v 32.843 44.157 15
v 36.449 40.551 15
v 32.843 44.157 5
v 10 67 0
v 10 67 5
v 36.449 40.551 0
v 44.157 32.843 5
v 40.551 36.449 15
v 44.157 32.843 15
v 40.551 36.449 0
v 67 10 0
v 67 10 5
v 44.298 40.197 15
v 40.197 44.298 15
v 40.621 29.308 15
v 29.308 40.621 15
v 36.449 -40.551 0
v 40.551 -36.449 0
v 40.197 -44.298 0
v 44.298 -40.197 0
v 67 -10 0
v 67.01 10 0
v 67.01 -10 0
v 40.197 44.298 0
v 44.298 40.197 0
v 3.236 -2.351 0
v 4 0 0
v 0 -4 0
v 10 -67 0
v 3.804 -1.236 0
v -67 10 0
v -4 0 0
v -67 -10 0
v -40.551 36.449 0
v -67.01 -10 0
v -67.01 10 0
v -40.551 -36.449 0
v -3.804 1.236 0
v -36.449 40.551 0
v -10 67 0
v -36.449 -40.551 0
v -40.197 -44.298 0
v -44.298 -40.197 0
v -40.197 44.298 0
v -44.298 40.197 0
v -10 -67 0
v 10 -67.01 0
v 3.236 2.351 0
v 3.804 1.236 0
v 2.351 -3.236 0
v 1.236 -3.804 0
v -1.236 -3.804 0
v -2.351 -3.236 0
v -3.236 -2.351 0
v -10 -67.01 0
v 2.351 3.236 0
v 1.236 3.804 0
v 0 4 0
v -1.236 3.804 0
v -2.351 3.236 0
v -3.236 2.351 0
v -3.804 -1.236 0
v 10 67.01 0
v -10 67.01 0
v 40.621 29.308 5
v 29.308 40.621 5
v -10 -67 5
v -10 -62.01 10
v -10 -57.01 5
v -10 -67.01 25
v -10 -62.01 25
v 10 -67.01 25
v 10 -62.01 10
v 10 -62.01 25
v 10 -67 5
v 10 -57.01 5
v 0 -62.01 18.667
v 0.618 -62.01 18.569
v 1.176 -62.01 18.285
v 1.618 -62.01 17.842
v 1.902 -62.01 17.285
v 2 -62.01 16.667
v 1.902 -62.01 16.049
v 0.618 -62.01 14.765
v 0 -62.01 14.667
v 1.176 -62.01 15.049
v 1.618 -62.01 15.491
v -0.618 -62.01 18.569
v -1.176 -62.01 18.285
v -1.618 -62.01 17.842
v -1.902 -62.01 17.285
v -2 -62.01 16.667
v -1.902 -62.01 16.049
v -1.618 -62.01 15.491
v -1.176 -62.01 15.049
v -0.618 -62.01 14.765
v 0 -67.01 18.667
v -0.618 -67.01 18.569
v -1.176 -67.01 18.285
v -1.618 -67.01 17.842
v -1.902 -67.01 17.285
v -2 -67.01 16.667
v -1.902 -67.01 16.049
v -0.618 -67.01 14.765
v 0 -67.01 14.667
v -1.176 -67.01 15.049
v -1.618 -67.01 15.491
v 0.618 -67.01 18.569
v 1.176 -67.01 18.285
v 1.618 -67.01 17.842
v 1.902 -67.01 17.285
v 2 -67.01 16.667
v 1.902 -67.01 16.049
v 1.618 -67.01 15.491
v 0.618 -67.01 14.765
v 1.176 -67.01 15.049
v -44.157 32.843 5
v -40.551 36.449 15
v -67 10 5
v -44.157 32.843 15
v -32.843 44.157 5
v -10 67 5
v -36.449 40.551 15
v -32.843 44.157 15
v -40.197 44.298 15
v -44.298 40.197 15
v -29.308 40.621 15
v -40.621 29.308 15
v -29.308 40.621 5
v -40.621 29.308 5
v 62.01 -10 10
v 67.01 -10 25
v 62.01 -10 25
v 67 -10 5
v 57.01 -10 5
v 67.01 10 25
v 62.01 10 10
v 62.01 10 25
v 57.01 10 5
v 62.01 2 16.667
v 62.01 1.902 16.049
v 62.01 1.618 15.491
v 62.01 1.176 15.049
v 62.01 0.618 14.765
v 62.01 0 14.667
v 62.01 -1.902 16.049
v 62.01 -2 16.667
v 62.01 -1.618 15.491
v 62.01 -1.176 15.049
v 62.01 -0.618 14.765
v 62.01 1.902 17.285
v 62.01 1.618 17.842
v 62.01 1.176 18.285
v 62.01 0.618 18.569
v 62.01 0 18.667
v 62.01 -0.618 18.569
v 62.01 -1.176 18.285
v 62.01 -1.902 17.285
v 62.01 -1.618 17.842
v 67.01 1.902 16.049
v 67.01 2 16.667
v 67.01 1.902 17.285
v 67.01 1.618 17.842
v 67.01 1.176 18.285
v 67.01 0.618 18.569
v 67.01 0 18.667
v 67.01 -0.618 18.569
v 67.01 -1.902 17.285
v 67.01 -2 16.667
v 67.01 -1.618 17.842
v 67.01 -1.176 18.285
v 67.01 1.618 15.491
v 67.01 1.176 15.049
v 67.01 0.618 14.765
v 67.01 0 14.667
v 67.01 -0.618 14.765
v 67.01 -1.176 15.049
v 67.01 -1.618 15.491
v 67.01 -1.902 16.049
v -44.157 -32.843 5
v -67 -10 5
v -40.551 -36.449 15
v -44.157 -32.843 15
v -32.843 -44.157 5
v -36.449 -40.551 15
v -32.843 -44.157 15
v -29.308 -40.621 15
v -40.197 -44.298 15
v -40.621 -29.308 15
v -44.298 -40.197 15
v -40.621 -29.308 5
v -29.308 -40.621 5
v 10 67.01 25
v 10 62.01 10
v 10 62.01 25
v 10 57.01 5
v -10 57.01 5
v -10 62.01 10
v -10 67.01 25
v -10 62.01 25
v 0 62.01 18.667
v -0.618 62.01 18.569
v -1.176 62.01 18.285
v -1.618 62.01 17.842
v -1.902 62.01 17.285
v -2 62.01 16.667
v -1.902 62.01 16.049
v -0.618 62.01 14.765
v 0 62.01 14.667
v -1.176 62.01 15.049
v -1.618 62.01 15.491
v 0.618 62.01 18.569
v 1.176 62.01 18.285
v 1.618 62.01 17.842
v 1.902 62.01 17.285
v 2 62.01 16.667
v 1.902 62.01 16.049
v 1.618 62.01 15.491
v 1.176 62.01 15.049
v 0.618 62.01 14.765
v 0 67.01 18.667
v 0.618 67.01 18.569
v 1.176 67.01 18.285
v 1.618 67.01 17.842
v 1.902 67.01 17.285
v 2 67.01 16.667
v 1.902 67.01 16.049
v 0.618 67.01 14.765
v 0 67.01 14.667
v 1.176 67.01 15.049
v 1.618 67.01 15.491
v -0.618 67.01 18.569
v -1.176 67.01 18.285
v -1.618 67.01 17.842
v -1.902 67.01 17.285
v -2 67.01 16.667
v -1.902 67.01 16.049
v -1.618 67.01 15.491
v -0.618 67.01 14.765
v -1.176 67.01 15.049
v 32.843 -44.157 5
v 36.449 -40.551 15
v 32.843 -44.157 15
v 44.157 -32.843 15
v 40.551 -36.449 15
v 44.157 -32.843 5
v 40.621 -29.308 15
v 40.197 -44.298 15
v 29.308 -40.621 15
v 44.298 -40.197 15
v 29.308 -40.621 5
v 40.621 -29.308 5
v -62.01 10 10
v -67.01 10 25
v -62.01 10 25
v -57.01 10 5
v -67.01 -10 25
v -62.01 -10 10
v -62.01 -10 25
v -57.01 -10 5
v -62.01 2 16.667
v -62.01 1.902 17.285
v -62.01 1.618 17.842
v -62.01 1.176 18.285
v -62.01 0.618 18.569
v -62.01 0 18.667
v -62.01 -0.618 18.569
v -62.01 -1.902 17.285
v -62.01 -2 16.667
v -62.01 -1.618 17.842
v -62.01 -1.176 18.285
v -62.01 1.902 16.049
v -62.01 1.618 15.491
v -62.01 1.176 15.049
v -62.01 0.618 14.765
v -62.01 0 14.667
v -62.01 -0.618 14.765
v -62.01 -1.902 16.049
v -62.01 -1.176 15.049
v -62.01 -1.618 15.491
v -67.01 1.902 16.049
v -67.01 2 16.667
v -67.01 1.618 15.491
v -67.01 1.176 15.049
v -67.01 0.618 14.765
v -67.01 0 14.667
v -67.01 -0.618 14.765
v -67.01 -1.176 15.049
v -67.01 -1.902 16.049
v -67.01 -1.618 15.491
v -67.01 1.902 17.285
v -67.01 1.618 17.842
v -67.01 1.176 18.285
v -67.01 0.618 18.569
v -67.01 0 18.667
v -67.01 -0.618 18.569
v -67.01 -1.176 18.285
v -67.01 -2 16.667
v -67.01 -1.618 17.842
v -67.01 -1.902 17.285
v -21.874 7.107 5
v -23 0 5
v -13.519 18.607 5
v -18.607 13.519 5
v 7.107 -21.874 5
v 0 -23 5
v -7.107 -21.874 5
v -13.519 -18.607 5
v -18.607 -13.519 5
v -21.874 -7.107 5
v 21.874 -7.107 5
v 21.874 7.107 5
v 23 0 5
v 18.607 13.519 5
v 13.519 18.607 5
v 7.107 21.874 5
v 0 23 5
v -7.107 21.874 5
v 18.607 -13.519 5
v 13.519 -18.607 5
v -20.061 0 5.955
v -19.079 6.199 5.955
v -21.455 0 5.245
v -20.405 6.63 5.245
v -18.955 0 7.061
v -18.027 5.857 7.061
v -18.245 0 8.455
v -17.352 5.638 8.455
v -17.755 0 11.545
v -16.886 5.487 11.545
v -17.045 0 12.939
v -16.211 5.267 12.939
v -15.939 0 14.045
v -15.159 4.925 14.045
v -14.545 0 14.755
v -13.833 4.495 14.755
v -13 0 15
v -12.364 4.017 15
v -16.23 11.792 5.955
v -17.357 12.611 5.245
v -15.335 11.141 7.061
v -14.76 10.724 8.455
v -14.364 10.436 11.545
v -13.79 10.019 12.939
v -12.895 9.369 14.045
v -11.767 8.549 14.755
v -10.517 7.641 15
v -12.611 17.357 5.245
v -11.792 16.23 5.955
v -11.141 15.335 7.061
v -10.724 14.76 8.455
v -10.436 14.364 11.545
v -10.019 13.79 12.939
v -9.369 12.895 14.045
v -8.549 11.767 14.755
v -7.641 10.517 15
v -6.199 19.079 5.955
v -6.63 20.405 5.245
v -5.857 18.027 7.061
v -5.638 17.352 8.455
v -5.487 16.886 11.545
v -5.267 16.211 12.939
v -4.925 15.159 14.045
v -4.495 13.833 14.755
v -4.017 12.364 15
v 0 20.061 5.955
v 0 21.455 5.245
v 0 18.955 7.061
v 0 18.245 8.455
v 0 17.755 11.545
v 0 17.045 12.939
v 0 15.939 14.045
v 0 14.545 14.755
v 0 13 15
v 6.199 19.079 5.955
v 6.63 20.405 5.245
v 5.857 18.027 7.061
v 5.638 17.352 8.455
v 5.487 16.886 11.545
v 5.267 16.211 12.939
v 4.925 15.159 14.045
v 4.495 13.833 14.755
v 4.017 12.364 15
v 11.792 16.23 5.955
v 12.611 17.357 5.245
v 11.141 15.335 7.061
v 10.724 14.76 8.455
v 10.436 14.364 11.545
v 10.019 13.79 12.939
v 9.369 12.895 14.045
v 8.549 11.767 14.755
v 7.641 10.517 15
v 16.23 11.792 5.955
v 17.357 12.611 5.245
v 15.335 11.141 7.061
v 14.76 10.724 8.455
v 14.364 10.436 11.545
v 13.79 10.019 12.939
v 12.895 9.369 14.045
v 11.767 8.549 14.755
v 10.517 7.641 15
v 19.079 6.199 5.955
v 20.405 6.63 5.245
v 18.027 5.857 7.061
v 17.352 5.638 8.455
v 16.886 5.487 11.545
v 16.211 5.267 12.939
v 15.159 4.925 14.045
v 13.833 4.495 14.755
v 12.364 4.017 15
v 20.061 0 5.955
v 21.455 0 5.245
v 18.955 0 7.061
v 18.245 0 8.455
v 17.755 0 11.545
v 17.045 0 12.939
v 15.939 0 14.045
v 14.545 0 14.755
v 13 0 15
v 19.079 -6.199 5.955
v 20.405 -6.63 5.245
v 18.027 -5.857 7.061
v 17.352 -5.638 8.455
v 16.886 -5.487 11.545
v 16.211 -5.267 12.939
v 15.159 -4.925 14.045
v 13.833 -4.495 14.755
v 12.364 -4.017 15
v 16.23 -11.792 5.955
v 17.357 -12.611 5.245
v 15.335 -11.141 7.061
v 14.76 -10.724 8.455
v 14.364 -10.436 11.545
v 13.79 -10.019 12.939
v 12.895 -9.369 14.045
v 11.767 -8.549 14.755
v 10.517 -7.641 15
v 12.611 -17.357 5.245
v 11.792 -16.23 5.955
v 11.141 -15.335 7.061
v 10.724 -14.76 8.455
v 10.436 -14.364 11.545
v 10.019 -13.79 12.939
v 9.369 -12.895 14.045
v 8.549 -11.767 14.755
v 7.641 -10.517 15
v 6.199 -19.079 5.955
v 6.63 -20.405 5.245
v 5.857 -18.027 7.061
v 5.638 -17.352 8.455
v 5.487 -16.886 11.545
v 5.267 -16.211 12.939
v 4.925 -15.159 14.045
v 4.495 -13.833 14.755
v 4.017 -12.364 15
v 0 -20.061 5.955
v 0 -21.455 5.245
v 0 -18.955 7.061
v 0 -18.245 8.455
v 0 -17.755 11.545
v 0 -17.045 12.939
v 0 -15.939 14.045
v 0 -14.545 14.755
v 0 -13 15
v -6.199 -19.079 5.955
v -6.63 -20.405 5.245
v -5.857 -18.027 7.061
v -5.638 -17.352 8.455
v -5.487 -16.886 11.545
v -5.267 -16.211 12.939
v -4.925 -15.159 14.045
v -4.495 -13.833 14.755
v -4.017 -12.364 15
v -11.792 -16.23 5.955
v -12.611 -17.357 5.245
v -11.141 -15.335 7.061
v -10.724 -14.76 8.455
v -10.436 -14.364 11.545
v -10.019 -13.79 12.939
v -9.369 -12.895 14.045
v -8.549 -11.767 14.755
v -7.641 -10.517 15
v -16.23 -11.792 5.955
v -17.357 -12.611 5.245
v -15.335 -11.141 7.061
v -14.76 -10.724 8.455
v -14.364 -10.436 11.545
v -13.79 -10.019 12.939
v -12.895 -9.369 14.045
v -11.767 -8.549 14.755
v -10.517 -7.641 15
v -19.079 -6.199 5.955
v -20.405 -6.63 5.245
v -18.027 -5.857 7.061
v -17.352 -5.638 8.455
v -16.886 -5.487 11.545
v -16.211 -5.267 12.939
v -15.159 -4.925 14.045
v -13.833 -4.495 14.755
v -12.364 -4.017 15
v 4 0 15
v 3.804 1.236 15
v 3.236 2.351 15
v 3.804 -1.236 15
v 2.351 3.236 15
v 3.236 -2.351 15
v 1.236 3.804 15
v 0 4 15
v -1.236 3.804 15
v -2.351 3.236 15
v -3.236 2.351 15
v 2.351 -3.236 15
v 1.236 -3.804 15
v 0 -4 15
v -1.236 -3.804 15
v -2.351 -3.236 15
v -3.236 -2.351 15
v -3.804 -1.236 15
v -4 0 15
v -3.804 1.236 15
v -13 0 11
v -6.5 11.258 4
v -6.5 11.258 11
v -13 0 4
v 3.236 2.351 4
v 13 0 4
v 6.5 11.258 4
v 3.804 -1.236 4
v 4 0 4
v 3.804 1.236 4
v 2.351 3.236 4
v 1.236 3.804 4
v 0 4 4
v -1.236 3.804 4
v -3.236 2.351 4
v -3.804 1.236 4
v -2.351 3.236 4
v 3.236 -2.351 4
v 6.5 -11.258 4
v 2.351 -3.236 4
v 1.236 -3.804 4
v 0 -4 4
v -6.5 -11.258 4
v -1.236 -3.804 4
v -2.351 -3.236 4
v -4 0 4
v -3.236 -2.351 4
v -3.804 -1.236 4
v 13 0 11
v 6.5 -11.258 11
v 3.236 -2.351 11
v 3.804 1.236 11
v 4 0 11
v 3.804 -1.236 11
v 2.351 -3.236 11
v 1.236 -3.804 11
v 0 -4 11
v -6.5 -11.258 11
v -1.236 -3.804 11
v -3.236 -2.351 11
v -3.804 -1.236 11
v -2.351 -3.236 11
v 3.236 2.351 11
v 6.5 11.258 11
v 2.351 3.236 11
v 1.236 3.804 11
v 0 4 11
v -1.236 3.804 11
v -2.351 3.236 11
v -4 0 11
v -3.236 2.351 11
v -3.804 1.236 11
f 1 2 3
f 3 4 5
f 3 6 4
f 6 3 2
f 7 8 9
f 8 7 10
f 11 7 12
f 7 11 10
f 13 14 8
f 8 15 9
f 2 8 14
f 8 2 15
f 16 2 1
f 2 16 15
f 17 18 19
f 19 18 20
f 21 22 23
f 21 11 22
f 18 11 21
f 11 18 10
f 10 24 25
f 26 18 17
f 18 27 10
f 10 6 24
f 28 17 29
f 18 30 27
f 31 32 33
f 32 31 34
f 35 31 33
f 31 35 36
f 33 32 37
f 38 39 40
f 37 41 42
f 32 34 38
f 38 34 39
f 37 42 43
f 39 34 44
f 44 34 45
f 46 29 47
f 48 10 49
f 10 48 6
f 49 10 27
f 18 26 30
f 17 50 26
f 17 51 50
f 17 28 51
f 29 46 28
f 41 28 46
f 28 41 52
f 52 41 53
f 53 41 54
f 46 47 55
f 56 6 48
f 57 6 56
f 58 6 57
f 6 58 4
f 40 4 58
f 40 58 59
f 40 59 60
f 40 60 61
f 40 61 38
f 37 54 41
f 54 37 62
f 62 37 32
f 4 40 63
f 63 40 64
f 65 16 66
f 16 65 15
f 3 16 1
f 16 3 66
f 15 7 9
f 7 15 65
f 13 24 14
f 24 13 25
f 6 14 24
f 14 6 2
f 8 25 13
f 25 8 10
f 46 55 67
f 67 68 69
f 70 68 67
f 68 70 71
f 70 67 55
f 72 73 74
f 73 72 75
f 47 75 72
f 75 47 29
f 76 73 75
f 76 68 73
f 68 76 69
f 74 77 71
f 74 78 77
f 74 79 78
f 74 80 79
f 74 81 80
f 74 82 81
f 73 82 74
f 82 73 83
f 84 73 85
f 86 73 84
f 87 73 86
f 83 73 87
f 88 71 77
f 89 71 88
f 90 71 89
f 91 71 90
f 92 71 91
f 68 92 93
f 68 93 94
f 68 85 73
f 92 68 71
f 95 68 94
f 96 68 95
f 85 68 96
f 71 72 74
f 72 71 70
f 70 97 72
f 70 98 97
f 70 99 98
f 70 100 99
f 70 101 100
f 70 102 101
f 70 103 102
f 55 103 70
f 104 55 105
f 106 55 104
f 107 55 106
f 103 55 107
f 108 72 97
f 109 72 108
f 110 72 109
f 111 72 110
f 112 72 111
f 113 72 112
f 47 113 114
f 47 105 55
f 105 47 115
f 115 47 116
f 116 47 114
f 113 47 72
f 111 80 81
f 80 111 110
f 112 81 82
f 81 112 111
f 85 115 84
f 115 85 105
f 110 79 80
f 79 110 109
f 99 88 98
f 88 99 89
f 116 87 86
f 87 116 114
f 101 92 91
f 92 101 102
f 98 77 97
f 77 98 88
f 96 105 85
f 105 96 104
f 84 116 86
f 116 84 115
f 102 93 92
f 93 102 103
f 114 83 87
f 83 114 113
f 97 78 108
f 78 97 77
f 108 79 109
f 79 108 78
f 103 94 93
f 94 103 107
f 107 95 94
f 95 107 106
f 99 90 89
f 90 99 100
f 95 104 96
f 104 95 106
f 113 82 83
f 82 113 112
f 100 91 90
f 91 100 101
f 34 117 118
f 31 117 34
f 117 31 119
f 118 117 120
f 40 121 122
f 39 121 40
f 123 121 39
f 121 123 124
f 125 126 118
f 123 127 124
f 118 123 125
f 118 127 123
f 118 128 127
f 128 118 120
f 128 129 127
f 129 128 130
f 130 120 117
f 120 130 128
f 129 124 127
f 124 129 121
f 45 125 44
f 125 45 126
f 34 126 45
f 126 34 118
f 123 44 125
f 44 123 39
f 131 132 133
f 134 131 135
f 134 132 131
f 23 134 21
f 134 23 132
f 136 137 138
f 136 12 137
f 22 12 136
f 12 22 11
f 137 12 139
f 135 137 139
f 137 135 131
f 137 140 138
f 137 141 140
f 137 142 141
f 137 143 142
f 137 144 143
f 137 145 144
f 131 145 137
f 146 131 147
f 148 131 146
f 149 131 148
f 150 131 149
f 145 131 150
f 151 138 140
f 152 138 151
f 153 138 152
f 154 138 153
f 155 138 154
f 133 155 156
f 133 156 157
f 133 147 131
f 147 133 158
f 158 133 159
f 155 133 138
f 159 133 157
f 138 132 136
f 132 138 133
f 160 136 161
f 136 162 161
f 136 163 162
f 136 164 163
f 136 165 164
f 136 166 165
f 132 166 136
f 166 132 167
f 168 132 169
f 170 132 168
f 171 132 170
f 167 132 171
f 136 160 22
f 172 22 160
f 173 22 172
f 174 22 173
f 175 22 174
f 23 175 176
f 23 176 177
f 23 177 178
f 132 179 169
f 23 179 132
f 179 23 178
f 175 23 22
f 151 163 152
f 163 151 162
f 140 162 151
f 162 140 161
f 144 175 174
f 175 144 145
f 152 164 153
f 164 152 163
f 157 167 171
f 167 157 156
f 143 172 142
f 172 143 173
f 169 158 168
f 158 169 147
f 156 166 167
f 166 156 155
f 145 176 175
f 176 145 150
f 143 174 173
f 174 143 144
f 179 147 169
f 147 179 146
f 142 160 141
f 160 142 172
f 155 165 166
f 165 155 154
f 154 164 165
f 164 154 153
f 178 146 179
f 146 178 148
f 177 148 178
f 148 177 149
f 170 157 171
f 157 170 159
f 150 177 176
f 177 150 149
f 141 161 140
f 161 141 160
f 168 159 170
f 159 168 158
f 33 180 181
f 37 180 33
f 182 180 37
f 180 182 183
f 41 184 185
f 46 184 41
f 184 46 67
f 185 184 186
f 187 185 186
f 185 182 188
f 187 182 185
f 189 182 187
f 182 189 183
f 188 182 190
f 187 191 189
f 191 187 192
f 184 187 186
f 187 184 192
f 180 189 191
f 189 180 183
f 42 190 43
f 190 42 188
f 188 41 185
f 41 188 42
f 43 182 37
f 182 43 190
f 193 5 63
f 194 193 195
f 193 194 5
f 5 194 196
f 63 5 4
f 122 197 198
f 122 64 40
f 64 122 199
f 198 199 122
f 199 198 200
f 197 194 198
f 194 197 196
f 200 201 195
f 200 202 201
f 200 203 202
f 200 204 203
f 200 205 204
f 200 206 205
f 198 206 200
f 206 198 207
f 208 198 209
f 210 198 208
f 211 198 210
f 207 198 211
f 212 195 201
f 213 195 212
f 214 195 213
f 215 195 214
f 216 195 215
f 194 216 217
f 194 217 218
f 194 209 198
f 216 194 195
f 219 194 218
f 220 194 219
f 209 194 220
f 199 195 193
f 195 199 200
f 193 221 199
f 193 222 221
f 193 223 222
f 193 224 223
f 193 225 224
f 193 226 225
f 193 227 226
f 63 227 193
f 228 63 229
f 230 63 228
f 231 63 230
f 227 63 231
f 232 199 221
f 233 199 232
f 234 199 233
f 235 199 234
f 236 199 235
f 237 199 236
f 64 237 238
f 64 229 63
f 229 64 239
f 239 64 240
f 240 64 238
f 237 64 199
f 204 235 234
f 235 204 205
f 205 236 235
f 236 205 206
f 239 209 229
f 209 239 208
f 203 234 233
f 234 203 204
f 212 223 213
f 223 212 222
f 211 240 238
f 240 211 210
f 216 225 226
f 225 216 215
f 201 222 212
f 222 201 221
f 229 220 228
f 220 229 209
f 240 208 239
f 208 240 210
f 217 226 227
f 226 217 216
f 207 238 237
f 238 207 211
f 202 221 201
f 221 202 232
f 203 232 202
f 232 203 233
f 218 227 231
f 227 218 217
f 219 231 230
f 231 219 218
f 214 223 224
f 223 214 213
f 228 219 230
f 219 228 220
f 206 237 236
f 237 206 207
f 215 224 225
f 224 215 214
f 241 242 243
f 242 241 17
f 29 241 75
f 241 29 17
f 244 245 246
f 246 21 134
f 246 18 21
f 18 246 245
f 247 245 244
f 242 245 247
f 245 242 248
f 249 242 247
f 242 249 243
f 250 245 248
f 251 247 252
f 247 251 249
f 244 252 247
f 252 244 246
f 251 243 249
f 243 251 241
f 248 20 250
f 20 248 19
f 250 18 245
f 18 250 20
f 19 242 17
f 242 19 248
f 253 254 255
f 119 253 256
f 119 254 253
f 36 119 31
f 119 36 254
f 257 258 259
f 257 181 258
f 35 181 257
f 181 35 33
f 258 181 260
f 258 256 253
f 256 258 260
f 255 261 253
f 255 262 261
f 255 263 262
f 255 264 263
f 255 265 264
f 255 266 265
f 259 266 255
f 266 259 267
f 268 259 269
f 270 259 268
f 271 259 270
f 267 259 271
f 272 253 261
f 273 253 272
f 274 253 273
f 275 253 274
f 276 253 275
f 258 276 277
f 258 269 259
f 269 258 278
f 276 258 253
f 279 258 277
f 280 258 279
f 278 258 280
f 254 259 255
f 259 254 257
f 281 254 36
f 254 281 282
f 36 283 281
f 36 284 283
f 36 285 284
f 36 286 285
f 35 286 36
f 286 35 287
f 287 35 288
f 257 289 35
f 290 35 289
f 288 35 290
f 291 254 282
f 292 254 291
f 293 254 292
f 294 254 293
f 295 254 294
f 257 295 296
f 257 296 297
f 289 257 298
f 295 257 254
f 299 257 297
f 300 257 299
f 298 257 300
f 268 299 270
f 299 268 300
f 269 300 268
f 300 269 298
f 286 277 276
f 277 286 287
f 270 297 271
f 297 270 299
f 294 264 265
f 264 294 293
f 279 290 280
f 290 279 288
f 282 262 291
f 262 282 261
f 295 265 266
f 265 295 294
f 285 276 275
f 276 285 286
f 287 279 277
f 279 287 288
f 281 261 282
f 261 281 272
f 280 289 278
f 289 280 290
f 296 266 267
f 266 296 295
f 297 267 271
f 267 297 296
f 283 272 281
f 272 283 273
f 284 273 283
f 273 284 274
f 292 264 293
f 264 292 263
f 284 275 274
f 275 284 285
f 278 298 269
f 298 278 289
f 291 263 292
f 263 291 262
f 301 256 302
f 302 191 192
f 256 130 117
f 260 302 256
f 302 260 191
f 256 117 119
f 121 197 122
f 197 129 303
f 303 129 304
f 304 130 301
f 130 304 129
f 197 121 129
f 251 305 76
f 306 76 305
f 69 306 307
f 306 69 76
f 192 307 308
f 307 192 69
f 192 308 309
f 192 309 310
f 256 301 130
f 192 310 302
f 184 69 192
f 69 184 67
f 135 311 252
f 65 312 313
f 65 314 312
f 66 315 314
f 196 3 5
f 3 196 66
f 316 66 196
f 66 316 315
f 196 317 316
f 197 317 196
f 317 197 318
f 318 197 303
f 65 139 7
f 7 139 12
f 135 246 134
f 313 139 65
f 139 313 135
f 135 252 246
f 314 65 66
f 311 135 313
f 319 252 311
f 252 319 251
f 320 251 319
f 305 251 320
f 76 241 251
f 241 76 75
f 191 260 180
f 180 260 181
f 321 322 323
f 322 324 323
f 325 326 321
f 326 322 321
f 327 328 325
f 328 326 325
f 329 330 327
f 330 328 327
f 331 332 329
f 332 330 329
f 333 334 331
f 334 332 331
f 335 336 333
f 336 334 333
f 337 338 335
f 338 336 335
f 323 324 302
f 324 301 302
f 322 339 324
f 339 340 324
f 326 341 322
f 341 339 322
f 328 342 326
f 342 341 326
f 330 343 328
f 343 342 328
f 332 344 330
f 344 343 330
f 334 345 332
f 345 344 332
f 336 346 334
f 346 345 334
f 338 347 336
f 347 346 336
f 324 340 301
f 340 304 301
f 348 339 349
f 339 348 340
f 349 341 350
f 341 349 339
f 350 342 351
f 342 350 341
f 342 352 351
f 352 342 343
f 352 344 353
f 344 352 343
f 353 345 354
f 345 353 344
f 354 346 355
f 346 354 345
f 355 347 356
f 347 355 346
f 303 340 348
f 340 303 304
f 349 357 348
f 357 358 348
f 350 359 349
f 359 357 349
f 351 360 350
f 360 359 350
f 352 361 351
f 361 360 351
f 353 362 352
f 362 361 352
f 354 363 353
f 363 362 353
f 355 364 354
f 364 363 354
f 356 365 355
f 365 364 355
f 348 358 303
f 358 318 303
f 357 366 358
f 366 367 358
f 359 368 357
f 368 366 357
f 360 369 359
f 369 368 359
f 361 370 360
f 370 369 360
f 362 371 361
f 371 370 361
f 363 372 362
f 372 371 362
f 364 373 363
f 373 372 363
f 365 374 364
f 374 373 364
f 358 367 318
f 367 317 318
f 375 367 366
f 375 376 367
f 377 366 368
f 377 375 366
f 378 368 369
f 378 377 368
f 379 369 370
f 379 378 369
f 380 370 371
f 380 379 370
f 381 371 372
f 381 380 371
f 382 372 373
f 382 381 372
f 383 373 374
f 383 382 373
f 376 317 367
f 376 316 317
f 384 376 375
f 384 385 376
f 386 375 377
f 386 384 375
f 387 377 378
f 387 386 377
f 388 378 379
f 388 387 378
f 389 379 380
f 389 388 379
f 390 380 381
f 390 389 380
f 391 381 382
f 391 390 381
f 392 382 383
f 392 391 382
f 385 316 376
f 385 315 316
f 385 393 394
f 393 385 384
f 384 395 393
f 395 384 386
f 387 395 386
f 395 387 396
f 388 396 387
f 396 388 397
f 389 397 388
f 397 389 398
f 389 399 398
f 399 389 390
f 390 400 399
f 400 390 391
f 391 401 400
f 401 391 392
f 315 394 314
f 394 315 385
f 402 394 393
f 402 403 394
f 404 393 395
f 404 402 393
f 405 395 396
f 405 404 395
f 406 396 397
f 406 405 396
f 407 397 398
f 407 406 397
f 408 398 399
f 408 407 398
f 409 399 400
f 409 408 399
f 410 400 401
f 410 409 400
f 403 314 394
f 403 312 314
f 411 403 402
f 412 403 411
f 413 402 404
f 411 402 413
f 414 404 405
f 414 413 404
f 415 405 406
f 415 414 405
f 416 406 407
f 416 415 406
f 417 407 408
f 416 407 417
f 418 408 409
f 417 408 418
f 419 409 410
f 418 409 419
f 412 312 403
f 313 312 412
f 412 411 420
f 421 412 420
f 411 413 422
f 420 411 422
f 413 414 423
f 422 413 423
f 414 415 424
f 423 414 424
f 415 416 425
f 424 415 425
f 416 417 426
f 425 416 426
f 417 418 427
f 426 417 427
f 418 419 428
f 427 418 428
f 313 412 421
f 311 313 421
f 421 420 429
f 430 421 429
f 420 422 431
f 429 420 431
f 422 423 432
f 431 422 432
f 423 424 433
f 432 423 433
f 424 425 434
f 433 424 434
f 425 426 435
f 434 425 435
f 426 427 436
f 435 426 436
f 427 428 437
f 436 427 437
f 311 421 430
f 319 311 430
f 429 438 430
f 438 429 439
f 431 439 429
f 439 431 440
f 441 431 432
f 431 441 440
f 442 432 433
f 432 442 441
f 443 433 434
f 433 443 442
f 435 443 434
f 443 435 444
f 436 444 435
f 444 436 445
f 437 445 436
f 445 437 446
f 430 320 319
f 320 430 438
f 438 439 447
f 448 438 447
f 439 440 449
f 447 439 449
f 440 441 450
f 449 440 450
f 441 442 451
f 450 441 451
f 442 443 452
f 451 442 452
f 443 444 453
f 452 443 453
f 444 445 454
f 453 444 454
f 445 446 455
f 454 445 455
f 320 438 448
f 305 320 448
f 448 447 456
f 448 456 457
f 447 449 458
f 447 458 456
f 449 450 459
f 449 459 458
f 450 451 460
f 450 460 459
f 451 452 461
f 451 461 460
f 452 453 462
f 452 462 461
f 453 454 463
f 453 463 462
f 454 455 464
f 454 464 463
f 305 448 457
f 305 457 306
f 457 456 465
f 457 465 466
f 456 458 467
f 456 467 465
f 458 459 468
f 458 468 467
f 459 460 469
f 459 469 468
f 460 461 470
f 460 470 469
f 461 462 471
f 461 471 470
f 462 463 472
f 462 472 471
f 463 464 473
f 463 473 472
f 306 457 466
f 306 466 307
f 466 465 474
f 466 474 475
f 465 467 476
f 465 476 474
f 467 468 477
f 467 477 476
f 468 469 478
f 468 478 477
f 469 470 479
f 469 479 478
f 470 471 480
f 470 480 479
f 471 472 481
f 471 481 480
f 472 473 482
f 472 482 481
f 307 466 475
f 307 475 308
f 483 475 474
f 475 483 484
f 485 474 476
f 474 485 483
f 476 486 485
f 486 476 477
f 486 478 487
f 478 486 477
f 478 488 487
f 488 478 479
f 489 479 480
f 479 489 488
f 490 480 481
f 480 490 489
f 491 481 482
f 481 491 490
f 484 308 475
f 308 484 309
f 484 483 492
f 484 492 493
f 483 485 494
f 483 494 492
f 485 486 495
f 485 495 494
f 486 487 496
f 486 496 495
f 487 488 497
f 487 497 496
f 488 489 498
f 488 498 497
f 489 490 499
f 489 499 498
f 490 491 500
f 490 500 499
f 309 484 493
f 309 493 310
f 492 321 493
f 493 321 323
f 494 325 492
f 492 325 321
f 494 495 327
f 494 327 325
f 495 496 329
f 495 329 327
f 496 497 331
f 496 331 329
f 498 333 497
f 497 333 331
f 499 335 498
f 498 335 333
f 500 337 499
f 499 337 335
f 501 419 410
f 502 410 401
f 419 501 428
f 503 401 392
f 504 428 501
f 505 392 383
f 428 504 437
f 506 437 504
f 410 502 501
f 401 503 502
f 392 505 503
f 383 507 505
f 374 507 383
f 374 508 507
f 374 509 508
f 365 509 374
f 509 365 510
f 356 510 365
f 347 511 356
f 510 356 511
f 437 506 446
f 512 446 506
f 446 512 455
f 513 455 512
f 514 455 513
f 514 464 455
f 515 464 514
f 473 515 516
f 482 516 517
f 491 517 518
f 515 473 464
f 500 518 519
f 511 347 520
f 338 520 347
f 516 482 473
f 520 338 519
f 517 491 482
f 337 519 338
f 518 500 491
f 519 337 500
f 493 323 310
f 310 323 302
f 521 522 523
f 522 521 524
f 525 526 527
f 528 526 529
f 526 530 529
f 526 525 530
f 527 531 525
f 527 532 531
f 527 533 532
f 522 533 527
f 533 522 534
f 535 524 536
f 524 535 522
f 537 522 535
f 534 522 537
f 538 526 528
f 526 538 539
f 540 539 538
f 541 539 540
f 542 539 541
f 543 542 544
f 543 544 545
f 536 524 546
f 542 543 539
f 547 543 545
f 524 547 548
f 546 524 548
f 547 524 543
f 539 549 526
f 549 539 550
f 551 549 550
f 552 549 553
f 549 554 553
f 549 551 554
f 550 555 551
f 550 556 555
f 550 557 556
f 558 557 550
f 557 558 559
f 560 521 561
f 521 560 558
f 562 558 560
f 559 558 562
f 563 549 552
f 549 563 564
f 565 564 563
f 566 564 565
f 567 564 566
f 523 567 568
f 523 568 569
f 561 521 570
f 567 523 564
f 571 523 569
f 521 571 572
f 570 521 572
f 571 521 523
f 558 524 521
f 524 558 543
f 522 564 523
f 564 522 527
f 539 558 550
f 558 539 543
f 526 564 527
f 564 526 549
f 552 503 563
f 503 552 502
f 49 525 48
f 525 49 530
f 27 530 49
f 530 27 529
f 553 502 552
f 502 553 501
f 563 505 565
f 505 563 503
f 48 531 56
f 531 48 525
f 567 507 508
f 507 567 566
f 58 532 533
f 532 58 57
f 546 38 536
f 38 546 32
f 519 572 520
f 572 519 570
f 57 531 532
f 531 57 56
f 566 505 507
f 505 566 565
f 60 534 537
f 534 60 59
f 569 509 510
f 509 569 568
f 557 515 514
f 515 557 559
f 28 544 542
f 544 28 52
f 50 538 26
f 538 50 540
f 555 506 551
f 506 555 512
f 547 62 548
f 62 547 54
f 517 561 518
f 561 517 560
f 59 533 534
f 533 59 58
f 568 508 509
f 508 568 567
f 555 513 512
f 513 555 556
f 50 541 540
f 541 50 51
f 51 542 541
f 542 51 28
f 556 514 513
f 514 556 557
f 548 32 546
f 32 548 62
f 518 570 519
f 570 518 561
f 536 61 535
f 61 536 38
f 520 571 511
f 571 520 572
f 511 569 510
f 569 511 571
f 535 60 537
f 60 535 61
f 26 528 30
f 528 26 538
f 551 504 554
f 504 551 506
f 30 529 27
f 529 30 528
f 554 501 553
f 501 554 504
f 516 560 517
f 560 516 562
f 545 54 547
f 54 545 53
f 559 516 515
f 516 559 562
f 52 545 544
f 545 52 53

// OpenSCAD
taille = 134;
largeurPatte = 20;
largeurGuide = 16;
epaisseur = 5;
epaisseurRenfort = 10;
$fn = 20;

difference() {
	union() {
		plateForme(taille, largeurPatte);
		for (i = [0 : 3]) {
			rotate(i * 90) {
				translate([taille / 4 + largeurPatte / 4, taille / 4 + largeurPatte / 4, 0]) {
					rotate(45) {
						guide(largeurGuide, epaisseur);
					}
				}
				translate([0, -taille / 2 - 0.01, 0]) { // 
					patteAccroche(20, 25, epaisseur); // Largeur, Hauteur, Epaisseur
				}
			}
		}
		translate([0, 0, epaisseur]) {
			renfortEcrou(23, epaisseurRenfort);
		}
	}
	translate([0, 0, (epaisseur + epaisseurRenfort) / 2]) {
		ecrou(13, 7);
	}
}

module plateForme(taille, largeurPatte) {
	linear_extrude(height = epaisseur, center = false, convexity = 10, twist = 0)
	polygon([	[-taille / 2, largeurPatte / 2], [-largeurPatte / 2, taille / 2],
				[largeurPatte / 2, taille / 2], [taille / 2, largeurPatte / 2],
				[taille / 2, -largeurPatte / 2], [largeurPatte / 2, -taille / 2],
				[-largeurPatte / 2, -taille / 2], [-taille / 2, -largeurPatte / 2]
	]);
}

module guide(largeur, epaisseur) {
	translate([-epaisseur, -largeur / 2, 0]) cube([epaisseur, largeur, 15]);
	translate([0, -2.9, 0]) cube([5.3, 5.8, 15]);
}

module ecrou(tailleEcrou, epaisseurEcrou) {
	union() {
		linear_extrude(height = epaisseurEcrou, center = true, convexity = 10, twist = 0)
		polygon(points =	[ [tailleEcrou, 0], 
						[tailleEcrou * cos(60), tailleEcrou * sin(60)], 
						[tailleEcrou * cos(120), tailleEcrou * sin(120)], 
						[tailleEcrou * cos(180), tailleEcrou * sin(180)], 
						[tailleEcrou * cos(240), tailleEcrou * sin(240)], 
						[tailleEcrou * cos(300), tailleEcrou * sin(300)]]);
		translate(v = [0, 0, -10]) {		
			cylinder(h=100, r=tailleEcrou * (4 / 13));
		}
	}
}

module patteAccroche(largeur, hauteur, epaisseur) {
	difference() {
		translate([-largeur / 2, , 00]) 		
		rotate([90, 0, 90]) 
		linear_extrude(height = largeur, center = false, convexity = 10, twist = 0)
		polygon([	[0, 0], [2 * epaisseur, 0],
					[2 * epaisseur, epaisseur], [epaisseur, 2 * epaisseur],
					[epaisseur, hauteur], [0, hauteur]
		]);
		translate ([0, 0, 2 * hauteur / 3]) 
		rotate ([90,0,0]) cylinder (h = 20, r = 2, center = true);
	}
}

module renfortEcrou(diametre, epaisseur) {
	translate([0,0, epaisseur / 2]) {
		rotate_extrude(convexity = 10) {
			difference() {
				union() {
					translate([(diametre - epaisseur) / 2, 0, 0]) square([diametre - epaisseur, epaisseur], true);
					translate([(diametre - epaisseur) , 0, 0]) circle(epaisseur / 2);
					translate([(diametre - epaisseur), -epaisseur /2, 0]) square([epaisseur, epaisseur /2]);
				}
				translate([diametre, 0, 0]) circle(epaisseur / 2);
			}
		}
	}
}
